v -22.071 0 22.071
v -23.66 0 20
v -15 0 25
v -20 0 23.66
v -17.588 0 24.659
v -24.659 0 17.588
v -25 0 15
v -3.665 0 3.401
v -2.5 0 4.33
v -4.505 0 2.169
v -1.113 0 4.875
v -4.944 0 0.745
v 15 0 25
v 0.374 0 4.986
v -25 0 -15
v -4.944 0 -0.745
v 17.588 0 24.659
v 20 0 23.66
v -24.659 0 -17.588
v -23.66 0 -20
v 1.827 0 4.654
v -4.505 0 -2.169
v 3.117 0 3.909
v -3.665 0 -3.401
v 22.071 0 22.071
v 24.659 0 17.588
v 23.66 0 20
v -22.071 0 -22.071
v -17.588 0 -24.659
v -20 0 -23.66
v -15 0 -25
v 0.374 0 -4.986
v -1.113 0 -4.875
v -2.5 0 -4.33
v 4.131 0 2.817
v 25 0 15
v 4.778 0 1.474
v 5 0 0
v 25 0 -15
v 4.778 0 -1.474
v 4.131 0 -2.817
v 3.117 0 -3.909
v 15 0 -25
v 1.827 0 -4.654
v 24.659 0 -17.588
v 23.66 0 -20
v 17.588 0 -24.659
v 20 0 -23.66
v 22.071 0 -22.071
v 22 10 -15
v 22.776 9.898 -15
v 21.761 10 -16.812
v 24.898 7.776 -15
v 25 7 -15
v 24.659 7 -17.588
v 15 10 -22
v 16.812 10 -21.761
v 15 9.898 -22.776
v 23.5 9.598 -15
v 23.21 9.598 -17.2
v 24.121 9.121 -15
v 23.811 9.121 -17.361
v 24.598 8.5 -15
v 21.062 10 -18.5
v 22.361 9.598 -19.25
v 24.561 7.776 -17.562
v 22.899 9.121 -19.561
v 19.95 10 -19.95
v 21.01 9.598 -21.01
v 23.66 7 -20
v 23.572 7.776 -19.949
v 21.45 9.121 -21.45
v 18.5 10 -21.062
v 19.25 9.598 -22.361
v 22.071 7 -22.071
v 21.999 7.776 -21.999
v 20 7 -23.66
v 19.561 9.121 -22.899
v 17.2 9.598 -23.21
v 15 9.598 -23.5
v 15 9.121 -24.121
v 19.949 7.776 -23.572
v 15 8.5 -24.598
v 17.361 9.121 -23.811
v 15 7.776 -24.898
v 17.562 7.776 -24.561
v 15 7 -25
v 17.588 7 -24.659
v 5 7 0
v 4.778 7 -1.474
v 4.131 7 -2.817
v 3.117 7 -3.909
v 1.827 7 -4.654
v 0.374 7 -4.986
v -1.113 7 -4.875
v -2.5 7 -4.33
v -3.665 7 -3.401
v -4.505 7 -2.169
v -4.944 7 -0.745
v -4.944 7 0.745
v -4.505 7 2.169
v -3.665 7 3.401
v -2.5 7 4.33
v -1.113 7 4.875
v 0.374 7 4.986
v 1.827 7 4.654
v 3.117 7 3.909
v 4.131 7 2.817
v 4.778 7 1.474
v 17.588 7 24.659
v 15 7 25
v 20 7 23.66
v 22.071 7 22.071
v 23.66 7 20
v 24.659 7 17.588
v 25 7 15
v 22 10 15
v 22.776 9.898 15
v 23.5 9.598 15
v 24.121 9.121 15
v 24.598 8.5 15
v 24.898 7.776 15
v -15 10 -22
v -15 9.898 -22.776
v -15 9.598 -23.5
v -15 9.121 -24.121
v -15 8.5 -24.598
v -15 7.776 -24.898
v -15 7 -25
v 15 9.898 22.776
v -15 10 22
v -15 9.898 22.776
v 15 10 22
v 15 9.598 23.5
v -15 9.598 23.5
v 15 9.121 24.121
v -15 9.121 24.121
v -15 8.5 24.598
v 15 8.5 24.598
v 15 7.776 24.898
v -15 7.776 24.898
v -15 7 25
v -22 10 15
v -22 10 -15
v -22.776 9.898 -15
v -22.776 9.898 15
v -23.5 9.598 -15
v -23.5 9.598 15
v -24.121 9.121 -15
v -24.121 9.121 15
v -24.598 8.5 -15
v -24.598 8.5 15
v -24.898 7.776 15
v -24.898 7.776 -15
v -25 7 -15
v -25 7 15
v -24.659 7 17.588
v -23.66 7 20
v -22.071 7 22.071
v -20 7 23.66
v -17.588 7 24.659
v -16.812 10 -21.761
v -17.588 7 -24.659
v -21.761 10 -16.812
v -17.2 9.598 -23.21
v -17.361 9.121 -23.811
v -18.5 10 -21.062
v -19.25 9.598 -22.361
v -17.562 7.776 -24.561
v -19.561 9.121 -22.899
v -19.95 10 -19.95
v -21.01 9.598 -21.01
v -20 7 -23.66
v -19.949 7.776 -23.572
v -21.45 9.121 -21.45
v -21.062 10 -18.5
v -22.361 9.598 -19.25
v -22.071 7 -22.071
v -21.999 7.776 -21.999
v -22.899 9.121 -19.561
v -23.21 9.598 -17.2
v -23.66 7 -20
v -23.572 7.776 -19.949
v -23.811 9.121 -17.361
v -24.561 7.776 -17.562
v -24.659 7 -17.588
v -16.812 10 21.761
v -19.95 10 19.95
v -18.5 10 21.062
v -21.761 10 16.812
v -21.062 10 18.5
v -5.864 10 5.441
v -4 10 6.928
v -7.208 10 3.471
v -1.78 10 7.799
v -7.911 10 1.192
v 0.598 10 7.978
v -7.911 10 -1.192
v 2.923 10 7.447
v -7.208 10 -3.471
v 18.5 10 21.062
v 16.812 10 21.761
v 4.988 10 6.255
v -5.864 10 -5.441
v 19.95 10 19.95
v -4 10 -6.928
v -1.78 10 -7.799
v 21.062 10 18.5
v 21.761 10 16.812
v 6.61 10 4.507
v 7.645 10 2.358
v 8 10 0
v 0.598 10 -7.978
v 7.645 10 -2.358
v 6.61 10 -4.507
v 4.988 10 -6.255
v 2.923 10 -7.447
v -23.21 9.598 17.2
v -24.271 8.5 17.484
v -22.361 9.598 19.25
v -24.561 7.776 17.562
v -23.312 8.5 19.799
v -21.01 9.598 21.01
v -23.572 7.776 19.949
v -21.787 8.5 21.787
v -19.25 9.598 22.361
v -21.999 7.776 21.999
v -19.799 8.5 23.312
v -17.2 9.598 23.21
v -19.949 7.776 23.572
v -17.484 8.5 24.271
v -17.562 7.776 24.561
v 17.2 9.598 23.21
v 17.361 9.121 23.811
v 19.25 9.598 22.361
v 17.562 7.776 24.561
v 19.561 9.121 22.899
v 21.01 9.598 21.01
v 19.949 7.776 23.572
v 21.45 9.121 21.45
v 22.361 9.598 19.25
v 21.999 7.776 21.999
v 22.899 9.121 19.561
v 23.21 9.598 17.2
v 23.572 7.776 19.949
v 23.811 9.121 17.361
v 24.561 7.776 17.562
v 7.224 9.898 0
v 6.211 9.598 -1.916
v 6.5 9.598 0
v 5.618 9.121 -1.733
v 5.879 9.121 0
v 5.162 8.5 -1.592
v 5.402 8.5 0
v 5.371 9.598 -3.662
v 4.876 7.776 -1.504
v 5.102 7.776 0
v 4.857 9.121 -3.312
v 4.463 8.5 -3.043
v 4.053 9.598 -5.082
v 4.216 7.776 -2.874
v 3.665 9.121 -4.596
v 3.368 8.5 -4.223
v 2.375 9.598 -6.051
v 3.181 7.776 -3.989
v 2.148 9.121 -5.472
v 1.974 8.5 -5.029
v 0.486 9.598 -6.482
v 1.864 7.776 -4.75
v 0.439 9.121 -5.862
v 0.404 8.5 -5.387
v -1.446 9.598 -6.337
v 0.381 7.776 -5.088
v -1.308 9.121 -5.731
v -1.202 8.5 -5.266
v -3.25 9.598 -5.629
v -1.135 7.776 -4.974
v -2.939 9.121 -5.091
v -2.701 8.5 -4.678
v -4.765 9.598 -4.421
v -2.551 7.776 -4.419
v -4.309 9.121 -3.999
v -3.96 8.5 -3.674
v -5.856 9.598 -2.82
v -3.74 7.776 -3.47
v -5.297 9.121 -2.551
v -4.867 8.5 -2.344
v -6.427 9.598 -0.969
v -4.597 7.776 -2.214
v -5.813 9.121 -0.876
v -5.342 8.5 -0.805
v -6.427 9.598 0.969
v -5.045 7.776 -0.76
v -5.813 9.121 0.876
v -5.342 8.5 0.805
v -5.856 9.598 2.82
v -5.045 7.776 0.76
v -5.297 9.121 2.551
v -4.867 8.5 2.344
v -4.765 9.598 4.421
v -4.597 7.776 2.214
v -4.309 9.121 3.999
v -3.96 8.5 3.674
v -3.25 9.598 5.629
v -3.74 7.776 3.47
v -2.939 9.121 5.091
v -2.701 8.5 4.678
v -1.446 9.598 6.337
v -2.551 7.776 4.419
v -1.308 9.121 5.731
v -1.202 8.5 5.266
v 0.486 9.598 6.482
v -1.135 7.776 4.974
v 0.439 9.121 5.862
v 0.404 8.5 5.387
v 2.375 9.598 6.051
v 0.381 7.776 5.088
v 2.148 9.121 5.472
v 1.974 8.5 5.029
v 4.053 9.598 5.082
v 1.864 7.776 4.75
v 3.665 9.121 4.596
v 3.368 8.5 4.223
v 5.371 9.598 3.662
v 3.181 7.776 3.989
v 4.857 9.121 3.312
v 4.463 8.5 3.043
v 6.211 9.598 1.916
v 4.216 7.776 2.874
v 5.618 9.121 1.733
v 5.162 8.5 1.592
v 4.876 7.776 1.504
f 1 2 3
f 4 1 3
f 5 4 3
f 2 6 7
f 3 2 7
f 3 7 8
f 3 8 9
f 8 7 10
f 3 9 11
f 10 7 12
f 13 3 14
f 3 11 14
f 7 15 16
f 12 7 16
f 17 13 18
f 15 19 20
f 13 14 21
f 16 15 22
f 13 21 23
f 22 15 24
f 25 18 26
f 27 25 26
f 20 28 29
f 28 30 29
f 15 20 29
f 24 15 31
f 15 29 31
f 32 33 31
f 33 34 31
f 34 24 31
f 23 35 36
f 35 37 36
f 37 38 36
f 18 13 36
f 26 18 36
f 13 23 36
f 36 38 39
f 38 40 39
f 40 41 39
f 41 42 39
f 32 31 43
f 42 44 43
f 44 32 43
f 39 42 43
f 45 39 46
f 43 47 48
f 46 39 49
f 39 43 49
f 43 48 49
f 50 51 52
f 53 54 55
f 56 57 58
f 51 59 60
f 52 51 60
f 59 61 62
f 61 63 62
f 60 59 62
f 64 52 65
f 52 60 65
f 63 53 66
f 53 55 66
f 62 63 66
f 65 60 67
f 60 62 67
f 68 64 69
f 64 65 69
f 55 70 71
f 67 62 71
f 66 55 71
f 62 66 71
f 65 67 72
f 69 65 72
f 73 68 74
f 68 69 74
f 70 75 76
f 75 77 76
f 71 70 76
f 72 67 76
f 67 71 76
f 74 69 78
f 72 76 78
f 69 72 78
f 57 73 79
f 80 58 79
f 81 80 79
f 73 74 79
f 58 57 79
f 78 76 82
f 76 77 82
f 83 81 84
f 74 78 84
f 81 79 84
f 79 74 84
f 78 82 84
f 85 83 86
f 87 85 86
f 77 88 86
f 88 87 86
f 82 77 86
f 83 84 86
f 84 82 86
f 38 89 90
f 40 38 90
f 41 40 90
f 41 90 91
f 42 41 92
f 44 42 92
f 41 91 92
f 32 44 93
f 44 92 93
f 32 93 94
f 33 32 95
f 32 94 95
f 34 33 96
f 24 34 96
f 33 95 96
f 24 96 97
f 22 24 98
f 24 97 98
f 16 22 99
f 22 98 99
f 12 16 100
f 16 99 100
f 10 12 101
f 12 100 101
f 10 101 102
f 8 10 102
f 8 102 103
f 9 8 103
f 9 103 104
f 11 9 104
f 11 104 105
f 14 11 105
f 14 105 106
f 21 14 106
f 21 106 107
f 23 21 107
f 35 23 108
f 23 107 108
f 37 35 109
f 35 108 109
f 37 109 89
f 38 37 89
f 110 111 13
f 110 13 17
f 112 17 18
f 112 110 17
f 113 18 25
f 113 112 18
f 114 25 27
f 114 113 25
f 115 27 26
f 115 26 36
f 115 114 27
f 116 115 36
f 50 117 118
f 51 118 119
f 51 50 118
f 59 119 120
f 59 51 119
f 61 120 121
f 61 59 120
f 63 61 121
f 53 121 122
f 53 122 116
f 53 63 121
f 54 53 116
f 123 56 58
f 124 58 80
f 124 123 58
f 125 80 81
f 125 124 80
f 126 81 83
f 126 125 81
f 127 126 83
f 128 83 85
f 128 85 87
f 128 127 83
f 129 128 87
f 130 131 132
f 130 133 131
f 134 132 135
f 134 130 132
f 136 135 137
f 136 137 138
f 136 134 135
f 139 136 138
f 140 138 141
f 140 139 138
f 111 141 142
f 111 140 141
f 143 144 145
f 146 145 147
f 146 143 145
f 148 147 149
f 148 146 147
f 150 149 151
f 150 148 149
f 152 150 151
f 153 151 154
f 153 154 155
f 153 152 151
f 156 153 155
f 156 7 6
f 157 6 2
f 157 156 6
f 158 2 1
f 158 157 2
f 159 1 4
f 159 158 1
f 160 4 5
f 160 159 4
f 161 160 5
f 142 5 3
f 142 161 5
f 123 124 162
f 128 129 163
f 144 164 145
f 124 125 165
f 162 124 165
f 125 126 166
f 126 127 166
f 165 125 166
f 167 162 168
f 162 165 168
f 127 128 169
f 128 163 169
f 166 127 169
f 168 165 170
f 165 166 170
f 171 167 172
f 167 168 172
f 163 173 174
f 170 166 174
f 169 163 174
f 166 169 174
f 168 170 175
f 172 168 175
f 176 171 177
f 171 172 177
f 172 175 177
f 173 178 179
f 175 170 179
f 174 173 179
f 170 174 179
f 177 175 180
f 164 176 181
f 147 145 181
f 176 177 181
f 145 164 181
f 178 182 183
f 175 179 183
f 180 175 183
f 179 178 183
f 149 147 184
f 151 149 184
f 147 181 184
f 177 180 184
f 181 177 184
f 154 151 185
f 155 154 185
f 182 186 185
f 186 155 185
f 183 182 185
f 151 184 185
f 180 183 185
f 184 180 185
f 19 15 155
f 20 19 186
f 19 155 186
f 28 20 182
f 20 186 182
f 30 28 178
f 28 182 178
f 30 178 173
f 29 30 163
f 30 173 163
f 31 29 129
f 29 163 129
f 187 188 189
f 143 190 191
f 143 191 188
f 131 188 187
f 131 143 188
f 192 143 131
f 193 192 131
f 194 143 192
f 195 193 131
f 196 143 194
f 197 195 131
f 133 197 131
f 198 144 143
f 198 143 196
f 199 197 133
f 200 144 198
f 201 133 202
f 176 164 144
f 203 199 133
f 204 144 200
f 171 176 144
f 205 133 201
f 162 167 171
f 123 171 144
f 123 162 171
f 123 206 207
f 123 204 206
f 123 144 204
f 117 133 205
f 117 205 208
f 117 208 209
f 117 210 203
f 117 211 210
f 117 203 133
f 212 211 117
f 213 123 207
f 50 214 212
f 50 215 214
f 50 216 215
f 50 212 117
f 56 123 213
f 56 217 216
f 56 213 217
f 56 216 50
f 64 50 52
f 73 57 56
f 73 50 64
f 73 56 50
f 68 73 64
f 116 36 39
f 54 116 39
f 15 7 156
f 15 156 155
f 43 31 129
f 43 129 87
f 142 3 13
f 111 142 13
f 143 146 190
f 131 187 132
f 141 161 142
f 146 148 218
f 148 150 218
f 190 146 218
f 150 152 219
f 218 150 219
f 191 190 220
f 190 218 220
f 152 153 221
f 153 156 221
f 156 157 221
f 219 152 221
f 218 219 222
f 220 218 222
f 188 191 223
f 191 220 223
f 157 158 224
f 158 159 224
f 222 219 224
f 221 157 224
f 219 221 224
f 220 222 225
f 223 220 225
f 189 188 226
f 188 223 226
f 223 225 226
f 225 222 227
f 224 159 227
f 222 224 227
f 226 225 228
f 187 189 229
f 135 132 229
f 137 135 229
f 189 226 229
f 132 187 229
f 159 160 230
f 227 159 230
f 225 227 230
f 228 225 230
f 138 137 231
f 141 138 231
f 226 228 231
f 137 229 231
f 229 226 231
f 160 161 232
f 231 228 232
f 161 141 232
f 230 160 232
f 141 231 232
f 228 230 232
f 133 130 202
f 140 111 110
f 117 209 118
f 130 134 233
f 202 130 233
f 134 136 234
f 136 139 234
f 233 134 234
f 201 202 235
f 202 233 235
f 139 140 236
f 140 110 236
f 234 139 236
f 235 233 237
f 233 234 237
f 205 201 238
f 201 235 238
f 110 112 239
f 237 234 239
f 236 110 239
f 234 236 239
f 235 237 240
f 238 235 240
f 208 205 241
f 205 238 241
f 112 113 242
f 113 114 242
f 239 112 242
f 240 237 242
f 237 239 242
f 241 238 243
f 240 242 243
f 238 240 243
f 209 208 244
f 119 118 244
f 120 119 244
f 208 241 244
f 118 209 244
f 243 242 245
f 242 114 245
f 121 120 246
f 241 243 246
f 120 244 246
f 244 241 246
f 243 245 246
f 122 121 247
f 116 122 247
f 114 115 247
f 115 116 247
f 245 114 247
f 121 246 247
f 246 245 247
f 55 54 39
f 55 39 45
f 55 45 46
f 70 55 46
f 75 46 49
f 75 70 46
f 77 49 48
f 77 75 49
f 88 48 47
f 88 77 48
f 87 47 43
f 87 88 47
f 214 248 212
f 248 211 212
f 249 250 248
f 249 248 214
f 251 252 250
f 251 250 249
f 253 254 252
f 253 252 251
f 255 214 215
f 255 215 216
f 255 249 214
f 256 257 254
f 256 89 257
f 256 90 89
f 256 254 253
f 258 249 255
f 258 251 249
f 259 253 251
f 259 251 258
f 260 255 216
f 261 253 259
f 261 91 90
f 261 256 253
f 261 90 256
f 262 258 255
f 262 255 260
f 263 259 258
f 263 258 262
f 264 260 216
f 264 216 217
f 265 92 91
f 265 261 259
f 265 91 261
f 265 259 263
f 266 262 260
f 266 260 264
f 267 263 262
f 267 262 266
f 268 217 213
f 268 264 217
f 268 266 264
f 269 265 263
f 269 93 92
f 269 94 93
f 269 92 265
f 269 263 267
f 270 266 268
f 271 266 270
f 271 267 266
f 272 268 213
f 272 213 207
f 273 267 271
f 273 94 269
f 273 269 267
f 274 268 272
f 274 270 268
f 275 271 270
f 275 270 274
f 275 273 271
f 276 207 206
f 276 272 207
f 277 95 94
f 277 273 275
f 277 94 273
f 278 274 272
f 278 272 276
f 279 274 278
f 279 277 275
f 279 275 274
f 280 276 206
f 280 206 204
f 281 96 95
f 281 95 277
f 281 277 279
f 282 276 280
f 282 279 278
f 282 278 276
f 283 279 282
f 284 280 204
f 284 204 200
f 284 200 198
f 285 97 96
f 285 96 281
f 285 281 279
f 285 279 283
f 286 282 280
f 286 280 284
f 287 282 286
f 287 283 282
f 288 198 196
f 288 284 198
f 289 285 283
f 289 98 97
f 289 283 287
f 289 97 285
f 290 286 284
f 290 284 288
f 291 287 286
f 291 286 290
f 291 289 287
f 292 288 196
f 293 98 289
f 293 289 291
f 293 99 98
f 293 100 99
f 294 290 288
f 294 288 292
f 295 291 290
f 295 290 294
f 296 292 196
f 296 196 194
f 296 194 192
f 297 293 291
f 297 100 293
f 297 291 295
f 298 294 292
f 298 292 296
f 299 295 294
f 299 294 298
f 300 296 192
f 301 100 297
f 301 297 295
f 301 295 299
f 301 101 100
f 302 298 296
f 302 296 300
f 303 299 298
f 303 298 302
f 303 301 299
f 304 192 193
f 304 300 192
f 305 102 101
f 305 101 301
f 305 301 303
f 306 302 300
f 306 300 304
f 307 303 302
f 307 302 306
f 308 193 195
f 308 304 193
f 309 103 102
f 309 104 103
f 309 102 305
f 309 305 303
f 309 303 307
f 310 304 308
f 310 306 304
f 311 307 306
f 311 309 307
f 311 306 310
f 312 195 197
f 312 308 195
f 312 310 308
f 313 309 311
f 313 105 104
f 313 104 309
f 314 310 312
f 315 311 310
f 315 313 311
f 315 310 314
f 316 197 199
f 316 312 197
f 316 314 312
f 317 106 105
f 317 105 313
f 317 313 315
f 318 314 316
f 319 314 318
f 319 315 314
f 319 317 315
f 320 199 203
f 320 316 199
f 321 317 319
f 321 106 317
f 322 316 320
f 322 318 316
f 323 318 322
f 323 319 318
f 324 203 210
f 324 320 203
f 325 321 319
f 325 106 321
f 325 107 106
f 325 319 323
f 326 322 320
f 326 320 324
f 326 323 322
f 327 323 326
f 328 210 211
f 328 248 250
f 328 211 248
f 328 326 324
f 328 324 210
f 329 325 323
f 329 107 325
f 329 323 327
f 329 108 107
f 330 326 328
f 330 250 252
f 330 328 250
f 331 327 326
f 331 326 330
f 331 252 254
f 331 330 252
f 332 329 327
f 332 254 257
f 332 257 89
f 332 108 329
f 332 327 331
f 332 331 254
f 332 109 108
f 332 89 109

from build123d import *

# Parameters (mm, degrees)
SKETCH_1_W          = 50
SKETCH_1_H          = 50
EXTRUDE_1_DEPTH     = 10
FILLET_1_R          = 10
SKETCH_2_R          = 5
CUT_EXTRUDE_1_DEPTH = 10
FILLET_2_R          = 3


with BuildPart() as part:
    # 草图1 → 凸台-拉伸1 (new body)
    with BuildSketch(Plane(origin=(0, 0, 0), x_dir=(1, 0, 0), z_dir=(0, 1, 0))):
        Rectangle(SKETCH_1_W, SKETCH_1_H)
    extrude(amount=EXTRUDE_1_DEPTH)

    # 圆角1
    fillet_1_edges = [part.edges().sort_by_distance(p)[0] for p in [
        (25, 5, 25),
        (-25, 5, 25),
        (-25, 5, -25),
        (25, 5, -25),
    ]]
    fillet(fillet_1_edges, radius=FILLET_1_R)

    # 草图2 → 切除-拉伸1 (cut)
    with BuildSketch(Plane(origin=(0, 10, 0), x_dir=(1, 0, 0), z_dir=(0, 1, 0))):
        Circle(SKETCH_2_R)
    extrude(amount=-CUT_EXTRUDE_1_DEPTH, mode=Mode.SUBTRACT)

    # 圆角2
    fillet_2_edges = [part.edges().sort_by_distance(p)[0] for p in [
        (0, 10, 25),
        (-25, 10, 0),
        (25, 10, 0),
        (0, 10, -25),
        (22.071067812, 10, 22.071067812),
        (22.071067812, 10, -22.071067812),
        (-22.071067812, 10, -22.071067812),
        (-22.071067812, 10, 22.071067812),
        (-5, 10, 0),
    ]]
    fillet(fillet_2_edges, radius=FILLET_2_R)


solid = part.part
